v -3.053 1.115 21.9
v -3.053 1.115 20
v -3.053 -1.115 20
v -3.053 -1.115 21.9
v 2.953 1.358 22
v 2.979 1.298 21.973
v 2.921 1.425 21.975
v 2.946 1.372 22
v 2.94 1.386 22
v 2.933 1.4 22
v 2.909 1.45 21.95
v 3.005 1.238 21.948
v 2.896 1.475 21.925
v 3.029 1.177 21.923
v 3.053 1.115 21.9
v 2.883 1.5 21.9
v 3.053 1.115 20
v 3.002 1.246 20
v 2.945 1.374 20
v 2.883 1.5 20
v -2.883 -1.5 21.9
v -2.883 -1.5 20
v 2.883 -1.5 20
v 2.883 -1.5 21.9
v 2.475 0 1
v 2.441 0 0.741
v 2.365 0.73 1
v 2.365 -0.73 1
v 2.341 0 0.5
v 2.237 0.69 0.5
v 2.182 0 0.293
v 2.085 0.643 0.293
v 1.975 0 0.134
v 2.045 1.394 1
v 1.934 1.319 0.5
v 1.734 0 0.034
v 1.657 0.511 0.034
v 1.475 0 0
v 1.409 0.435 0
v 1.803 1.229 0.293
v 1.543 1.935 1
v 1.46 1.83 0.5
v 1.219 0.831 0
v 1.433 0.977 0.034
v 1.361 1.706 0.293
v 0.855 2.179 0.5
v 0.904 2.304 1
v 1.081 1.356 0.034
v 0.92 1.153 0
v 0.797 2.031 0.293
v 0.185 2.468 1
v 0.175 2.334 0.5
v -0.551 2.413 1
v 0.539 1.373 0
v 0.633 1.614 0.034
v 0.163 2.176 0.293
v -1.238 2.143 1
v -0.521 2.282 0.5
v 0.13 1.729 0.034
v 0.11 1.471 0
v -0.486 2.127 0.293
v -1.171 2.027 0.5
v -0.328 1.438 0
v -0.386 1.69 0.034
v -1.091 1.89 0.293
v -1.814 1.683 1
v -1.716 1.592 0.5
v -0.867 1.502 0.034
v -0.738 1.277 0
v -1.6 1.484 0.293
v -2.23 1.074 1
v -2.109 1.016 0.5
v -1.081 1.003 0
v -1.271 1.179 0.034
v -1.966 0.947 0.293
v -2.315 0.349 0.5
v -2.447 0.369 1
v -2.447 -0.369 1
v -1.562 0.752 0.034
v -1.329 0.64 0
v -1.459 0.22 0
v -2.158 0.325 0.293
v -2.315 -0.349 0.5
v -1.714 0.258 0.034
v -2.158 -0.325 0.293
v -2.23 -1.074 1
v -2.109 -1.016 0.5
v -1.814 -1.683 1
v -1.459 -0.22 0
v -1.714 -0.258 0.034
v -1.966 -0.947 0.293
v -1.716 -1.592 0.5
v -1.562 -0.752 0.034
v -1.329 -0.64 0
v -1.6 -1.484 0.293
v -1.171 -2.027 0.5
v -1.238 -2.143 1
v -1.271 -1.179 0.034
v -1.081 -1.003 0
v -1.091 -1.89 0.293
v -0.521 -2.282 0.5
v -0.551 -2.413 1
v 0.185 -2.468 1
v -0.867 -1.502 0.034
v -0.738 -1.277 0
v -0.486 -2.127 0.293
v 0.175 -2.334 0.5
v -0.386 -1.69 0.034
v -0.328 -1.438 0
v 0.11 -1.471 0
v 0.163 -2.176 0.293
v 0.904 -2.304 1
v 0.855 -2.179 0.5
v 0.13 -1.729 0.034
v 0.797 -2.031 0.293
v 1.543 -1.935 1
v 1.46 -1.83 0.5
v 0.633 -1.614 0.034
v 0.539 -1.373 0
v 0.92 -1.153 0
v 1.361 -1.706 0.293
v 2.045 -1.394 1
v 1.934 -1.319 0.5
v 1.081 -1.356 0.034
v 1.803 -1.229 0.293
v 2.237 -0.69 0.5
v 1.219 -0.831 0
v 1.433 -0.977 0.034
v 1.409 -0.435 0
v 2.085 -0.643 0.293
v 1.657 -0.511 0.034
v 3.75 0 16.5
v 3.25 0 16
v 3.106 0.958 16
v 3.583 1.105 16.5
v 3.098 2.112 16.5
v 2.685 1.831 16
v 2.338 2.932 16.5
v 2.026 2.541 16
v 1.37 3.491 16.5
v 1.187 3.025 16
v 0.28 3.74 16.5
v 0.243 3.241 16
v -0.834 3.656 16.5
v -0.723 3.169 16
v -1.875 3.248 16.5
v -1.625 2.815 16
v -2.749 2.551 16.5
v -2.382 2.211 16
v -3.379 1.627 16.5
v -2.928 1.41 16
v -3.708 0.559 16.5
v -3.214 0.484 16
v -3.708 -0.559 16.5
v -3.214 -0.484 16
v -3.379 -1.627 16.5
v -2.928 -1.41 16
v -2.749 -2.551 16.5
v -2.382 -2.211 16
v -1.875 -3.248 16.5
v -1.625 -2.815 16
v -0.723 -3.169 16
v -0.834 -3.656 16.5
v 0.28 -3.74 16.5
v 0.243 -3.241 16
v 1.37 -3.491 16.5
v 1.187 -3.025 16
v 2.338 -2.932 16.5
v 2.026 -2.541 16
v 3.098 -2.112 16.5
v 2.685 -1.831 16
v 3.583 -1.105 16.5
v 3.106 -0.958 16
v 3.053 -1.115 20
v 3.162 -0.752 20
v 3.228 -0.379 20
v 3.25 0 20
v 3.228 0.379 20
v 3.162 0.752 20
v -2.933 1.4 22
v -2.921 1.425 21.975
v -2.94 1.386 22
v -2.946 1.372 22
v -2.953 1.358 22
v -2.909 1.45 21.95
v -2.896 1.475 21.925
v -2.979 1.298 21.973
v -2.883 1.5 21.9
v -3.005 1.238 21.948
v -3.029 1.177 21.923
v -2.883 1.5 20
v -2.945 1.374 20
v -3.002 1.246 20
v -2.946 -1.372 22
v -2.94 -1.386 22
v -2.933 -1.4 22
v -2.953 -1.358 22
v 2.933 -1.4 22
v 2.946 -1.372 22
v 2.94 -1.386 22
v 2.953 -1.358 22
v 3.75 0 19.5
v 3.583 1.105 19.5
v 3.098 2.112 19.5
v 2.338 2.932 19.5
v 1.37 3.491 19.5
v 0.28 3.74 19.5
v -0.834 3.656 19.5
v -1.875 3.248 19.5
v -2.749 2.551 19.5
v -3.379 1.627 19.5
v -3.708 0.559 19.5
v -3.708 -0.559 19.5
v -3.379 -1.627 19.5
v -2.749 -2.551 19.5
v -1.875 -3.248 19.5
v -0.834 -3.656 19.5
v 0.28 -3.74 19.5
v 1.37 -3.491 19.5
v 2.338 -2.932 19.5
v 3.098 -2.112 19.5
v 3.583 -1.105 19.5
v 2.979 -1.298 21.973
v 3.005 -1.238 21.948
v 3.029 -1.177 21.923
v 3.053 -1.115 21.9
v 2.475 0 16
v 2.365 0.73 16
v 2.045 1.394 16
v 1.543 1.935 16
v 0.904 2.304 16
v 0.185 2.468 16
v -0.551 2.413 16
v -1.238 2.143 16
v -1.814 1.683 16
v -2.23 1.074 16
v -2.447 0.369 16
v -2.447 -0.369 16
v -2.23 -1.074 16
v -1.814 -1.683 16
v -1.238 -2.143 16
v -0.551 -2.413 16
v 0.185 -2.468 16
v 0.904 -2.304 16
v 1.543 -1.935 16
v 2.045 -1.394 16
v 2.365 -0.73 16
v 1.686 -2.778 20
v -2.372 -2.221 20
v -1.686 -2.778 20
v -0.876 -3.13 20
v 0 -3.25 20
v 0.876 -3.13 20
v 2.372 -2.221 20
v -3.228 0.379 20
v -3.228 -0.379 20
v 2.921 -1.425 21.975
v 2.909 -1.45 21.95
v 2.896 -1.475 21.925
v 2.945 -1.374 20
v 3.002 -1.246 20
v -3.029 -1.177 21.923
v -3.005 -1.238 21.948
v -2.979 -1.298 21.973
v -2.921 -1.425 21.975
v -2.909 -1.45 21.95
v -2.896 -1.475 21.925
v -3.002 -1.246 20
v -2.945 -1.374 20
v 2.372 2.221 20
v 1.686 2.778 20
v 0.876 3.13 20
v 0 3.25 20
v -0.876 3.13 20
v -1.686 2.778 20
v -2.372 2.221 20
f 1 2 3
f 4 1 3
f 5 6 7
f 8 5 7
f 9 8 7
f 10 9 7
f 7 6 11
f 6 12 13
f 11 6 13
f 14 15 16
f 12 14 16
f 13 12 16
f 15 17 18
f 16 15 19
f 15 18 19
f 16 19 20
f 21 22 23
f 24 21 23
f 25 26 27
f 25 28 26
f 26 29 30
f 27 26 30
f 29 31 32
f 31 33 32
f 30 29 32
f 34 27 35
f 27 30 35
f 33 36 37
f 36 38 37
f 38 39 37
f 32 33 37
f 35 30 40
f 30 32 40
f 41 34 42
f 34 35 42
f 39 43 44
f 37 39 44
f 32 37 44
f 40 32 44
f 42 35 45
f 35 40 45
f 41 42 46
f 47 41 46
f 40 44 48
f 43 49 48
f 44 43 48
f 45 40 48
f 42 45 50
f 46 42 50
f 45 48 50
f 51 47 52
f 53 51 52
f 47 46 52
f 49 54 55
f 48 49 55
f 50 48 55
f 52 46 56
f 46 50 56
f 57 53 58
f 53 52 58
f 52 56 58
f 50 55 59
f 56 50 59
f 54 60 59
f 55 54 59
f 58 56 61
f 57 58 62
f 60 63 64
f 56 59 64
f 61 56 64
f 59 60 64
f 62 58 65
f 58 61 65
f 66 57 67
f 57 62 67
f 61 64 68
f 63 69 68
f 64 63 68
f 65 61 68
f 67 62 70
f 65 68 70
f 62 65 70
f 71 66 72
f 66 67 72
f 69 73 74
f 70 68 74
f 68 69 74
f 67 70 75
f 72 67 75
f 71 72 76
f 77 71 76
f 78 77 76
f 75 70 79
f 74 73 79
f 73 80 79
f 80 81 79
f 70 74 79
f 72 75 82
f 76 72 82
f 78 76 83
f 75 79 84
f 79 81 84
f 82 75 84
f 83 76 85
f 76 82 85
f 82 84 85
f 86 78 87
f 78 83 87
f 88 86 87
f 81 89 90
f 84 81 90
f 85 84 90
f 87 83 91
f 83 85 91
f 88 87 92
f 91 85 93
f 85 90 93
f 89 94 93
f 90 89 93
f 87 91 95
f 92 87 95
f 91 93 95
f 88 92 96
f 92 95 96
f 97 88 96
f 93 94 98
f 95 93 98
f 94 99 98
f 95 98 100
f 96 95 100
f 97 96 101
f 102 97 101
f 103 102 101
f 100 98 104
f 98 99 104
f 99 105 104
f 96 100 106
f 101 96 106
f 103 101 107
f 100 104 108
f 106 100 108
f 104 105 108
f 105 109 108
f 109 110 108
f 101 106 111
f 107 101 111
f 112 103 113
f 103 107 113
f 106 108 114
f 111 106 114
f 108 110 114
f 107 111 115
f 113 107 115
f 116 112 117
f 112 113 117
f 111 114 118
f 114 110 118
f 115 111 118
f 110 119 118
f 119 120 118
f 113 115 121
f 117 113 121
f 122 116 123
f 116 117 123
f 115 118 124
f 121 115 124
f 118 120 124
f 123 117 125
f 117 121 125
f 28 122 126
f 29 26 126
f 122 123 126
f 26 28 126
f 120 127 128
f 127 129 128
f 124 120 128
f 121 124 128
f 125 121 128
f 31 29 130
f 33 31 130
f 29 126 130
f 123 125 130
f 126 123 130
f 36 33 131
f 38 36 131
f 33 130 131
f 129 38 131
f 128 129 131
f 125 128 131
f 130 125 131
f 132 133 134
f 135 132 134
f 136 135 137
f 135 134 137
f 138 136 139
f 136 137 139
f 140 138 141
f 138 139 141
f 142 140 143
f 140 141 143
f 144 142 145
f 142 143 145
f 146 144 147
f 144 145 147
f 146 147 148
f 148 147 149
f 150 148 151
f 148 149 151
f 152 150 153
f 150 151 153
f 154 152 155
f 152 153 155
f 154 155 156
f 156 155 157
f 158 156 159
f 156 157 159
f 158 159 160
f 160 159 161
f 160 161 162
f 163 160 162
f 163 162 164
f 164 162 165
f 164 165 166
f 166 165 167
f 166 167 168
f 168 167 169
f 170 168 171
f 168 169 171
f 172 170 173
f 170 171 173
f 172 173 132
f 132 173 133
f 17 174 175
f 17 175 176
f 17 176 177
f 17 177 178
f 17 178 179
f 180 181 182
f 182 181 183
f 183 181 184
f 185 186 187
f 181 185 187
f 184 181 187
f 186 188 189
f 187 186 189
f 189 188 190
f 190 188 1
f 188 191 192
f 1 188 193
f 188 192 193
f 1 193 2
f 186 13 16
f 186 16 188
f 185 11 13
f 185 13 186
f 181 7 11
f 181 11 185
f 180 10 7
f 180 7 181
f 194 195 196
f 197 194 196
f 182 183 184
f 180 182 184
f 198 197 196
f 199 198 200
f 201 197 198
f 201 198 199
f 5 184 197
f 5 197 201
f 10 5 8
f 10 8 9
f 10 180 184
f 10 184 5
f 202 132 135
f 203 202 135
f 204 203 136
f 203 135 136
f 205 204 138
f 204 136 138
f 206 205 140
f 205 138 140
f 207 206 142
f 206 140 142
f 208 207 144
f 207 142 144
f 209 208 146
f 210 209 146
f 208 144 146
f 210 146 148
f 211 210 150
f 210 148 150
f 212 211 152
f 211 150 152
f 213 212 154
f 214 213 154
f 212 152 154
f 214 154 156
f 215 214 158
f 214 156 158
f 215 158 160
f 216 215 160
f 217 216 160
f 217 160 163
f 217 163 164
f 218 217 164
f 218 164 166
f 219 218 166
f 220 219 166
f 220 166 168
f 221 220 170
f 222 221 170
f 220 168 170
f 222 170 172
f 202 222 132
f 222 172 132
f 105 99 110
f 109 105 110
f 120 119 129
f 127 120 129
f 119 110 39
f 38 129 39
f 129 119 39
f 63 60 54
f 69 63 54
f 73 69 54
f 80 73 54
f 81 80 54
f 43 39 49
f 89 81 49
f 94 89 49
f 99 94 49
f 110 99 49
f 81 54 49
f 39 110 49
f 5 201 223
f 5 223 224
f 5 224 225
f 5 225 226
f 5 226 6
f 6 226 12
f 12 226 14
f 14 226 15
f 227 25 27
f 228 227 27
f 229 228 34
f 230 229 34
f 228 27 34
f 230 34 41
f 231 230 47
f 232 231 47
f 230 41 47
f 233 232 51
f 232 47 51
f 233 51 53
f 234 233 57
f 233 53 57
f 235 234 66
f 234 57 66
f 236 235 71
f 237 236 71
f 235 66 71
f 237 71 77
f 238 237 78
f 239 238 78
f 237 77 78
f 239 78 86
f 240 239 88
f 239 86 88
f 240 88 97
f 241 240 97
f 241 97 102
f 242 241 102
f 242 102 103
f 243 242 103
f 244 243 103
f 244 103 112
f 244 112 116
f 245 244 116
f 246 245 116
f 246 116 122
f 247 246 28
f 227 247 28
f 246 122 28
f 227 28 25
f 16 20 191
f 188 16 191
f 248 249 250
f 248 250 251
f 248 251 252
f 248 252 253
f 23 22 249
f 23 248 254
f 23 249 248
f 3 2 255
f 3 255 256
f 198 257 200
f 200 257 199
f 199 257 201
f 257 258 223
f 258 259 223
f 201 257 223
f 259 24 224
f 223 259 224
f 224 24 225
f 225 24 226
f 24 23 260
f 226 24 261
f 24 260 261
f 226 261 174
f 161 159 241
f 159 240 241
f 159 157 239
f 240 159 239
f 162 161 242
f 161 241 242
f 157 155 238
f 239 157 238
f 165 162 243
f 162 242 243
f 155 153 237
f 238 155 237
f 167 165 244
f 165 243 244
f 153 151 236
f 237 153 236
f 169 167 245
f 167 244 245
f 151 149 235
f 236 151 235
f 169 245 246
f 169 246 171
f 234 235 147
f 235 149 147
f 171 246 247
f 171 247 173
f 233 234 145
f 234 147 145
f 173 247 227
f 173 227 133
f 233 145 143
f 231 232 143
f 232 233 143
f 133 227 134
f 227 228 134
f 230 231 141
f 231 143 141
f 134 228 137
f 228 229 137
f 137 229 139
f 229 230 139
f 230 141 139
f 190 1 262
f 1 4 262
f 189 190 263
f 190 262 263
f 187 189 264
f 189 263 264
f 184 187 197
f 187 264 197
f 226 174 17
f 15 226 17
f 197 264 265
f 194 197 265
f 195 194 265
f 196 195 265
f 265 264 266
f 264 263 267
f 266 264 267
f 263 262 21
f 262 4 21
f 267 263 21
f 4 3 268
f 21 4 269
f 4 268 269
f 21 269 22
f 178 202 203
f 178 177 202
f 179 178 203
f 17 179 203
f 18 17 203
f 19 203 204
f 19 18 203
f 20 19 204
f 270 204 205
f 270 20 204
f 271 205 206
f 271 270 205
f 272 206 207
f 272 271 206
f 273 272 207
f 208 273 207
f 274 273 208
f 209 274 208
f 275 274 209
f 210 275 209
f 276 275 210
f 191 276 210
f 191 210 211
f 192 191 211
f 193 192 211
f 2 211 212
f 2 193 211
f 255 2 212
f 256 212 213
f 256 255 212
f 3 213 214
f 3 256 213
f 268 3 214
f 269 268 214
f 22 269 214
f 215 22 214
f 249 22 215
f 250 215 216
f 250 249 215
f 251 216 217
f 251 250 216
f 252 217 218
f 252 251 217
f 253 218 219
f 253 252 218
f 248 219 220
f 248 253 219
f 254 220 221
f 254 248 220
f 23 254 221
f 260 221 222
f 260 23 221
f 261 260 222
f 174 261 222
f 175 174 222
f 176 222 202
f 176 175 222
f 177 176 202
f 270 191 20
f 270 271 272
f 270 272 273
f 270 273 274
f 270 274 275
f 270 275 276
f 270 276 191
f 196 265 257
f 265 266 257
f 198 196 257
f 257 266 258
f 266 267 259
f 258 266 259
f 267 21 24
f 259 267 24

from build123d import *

# Parameters (mm, degrees)
SKETCH_1_R      = 2.475
EXTRUDE_1_DEPTH = 16
SKETCH_2_R      = 3.75
EXTRUDE_2_DEPTH = 4
CHAMFER_1_SIZE  = 0.5
EXTRUDE_3_DEPTH = 2
CHAMFER_2_SIZE  = 0.1
FILLET_1_R      = 1


# Read off the part's stored shape, not the designer's step: the extrude step
with BuildPart() as part:
    # 스케치1 → 보스-돌출1 (new body)
    with BuildSketch(Plane.XY):
        Circle(SKETCH_1_R)
    extrude(amount=EXTRUDE_1_DEPTH)

    # 스케치2 → 보스-돌출2 (add)
    with BuildSketch(Plane.XY.offset(16)):
        Circle(SKETCH_2_R)
    extrude(amount=EXTRUDE_2_DEPTH)

    # 모따기1
    chamfer_1_edges = [part.edges().sort_by_distance(p)[0] for p in [
        (-3.75, 0, 16),
        (-3.75, 0, 20),
    ]]
    chamfer(chamfer_1_edges, length=CHAMFER_1_SIZE)

    # 보스-돌출3 outline → 보스-돌출3 (add)
    with BuildSketch(Plane.XY.offset(20)):
        with BuildLine():
            ThreePointArc((2.883140649, -1.5), (2.974111162, -1.310405585), (3.05263006, -1.115324937))
            Line((3.05263006, -1.115324937), (3.05263006, 1.115324937))
            ThreePointArc((3.05263006, 1.115324937), (2.974111162, 1.310405585), (2.883140649, 1.5))
            Line((2.883140649, 1.5), (-2.883140649, 1.5))
            ThreePointArc((-2.883140649, 1.5), (-2.974111162, 1.310405585), (-3.05263006, 1.115324937))
            Line((-3.05263006, 1.115324937), (-3.05263006, -1.115324937))
            ThreePointArc((-3.05263006, -1.115324937), (-2.974111162, -1.310405585), (-2.883140649, -1.5))
            Line((-2.883140649, -1.5), (2.883140649, -1.5))
        make_face()
    extrude(amount=EXTRUDE_3_DEPTH)

    # 모따기2
    chamfer_2_edges = [part.edges().sort_by_distance(p)[0] for p in [
        (3.05263006, 0, 22),
        (-3.05263006, 0, 22),
        (0, -1.5, 22),
        (0, 1.5, 22),
    ]]
    chamfer(chamfer_2_edges, length=CHAMFER_2_SIZE)

    # 필렛1
    fillet_1_edges = [part.edges().sort_by_distance(p)[0] for p in [
        (-2.475, 0, 0),
    ]]
    fillet(fillet_1_edges, radius=FILLET_1_R)


solid = part.part
